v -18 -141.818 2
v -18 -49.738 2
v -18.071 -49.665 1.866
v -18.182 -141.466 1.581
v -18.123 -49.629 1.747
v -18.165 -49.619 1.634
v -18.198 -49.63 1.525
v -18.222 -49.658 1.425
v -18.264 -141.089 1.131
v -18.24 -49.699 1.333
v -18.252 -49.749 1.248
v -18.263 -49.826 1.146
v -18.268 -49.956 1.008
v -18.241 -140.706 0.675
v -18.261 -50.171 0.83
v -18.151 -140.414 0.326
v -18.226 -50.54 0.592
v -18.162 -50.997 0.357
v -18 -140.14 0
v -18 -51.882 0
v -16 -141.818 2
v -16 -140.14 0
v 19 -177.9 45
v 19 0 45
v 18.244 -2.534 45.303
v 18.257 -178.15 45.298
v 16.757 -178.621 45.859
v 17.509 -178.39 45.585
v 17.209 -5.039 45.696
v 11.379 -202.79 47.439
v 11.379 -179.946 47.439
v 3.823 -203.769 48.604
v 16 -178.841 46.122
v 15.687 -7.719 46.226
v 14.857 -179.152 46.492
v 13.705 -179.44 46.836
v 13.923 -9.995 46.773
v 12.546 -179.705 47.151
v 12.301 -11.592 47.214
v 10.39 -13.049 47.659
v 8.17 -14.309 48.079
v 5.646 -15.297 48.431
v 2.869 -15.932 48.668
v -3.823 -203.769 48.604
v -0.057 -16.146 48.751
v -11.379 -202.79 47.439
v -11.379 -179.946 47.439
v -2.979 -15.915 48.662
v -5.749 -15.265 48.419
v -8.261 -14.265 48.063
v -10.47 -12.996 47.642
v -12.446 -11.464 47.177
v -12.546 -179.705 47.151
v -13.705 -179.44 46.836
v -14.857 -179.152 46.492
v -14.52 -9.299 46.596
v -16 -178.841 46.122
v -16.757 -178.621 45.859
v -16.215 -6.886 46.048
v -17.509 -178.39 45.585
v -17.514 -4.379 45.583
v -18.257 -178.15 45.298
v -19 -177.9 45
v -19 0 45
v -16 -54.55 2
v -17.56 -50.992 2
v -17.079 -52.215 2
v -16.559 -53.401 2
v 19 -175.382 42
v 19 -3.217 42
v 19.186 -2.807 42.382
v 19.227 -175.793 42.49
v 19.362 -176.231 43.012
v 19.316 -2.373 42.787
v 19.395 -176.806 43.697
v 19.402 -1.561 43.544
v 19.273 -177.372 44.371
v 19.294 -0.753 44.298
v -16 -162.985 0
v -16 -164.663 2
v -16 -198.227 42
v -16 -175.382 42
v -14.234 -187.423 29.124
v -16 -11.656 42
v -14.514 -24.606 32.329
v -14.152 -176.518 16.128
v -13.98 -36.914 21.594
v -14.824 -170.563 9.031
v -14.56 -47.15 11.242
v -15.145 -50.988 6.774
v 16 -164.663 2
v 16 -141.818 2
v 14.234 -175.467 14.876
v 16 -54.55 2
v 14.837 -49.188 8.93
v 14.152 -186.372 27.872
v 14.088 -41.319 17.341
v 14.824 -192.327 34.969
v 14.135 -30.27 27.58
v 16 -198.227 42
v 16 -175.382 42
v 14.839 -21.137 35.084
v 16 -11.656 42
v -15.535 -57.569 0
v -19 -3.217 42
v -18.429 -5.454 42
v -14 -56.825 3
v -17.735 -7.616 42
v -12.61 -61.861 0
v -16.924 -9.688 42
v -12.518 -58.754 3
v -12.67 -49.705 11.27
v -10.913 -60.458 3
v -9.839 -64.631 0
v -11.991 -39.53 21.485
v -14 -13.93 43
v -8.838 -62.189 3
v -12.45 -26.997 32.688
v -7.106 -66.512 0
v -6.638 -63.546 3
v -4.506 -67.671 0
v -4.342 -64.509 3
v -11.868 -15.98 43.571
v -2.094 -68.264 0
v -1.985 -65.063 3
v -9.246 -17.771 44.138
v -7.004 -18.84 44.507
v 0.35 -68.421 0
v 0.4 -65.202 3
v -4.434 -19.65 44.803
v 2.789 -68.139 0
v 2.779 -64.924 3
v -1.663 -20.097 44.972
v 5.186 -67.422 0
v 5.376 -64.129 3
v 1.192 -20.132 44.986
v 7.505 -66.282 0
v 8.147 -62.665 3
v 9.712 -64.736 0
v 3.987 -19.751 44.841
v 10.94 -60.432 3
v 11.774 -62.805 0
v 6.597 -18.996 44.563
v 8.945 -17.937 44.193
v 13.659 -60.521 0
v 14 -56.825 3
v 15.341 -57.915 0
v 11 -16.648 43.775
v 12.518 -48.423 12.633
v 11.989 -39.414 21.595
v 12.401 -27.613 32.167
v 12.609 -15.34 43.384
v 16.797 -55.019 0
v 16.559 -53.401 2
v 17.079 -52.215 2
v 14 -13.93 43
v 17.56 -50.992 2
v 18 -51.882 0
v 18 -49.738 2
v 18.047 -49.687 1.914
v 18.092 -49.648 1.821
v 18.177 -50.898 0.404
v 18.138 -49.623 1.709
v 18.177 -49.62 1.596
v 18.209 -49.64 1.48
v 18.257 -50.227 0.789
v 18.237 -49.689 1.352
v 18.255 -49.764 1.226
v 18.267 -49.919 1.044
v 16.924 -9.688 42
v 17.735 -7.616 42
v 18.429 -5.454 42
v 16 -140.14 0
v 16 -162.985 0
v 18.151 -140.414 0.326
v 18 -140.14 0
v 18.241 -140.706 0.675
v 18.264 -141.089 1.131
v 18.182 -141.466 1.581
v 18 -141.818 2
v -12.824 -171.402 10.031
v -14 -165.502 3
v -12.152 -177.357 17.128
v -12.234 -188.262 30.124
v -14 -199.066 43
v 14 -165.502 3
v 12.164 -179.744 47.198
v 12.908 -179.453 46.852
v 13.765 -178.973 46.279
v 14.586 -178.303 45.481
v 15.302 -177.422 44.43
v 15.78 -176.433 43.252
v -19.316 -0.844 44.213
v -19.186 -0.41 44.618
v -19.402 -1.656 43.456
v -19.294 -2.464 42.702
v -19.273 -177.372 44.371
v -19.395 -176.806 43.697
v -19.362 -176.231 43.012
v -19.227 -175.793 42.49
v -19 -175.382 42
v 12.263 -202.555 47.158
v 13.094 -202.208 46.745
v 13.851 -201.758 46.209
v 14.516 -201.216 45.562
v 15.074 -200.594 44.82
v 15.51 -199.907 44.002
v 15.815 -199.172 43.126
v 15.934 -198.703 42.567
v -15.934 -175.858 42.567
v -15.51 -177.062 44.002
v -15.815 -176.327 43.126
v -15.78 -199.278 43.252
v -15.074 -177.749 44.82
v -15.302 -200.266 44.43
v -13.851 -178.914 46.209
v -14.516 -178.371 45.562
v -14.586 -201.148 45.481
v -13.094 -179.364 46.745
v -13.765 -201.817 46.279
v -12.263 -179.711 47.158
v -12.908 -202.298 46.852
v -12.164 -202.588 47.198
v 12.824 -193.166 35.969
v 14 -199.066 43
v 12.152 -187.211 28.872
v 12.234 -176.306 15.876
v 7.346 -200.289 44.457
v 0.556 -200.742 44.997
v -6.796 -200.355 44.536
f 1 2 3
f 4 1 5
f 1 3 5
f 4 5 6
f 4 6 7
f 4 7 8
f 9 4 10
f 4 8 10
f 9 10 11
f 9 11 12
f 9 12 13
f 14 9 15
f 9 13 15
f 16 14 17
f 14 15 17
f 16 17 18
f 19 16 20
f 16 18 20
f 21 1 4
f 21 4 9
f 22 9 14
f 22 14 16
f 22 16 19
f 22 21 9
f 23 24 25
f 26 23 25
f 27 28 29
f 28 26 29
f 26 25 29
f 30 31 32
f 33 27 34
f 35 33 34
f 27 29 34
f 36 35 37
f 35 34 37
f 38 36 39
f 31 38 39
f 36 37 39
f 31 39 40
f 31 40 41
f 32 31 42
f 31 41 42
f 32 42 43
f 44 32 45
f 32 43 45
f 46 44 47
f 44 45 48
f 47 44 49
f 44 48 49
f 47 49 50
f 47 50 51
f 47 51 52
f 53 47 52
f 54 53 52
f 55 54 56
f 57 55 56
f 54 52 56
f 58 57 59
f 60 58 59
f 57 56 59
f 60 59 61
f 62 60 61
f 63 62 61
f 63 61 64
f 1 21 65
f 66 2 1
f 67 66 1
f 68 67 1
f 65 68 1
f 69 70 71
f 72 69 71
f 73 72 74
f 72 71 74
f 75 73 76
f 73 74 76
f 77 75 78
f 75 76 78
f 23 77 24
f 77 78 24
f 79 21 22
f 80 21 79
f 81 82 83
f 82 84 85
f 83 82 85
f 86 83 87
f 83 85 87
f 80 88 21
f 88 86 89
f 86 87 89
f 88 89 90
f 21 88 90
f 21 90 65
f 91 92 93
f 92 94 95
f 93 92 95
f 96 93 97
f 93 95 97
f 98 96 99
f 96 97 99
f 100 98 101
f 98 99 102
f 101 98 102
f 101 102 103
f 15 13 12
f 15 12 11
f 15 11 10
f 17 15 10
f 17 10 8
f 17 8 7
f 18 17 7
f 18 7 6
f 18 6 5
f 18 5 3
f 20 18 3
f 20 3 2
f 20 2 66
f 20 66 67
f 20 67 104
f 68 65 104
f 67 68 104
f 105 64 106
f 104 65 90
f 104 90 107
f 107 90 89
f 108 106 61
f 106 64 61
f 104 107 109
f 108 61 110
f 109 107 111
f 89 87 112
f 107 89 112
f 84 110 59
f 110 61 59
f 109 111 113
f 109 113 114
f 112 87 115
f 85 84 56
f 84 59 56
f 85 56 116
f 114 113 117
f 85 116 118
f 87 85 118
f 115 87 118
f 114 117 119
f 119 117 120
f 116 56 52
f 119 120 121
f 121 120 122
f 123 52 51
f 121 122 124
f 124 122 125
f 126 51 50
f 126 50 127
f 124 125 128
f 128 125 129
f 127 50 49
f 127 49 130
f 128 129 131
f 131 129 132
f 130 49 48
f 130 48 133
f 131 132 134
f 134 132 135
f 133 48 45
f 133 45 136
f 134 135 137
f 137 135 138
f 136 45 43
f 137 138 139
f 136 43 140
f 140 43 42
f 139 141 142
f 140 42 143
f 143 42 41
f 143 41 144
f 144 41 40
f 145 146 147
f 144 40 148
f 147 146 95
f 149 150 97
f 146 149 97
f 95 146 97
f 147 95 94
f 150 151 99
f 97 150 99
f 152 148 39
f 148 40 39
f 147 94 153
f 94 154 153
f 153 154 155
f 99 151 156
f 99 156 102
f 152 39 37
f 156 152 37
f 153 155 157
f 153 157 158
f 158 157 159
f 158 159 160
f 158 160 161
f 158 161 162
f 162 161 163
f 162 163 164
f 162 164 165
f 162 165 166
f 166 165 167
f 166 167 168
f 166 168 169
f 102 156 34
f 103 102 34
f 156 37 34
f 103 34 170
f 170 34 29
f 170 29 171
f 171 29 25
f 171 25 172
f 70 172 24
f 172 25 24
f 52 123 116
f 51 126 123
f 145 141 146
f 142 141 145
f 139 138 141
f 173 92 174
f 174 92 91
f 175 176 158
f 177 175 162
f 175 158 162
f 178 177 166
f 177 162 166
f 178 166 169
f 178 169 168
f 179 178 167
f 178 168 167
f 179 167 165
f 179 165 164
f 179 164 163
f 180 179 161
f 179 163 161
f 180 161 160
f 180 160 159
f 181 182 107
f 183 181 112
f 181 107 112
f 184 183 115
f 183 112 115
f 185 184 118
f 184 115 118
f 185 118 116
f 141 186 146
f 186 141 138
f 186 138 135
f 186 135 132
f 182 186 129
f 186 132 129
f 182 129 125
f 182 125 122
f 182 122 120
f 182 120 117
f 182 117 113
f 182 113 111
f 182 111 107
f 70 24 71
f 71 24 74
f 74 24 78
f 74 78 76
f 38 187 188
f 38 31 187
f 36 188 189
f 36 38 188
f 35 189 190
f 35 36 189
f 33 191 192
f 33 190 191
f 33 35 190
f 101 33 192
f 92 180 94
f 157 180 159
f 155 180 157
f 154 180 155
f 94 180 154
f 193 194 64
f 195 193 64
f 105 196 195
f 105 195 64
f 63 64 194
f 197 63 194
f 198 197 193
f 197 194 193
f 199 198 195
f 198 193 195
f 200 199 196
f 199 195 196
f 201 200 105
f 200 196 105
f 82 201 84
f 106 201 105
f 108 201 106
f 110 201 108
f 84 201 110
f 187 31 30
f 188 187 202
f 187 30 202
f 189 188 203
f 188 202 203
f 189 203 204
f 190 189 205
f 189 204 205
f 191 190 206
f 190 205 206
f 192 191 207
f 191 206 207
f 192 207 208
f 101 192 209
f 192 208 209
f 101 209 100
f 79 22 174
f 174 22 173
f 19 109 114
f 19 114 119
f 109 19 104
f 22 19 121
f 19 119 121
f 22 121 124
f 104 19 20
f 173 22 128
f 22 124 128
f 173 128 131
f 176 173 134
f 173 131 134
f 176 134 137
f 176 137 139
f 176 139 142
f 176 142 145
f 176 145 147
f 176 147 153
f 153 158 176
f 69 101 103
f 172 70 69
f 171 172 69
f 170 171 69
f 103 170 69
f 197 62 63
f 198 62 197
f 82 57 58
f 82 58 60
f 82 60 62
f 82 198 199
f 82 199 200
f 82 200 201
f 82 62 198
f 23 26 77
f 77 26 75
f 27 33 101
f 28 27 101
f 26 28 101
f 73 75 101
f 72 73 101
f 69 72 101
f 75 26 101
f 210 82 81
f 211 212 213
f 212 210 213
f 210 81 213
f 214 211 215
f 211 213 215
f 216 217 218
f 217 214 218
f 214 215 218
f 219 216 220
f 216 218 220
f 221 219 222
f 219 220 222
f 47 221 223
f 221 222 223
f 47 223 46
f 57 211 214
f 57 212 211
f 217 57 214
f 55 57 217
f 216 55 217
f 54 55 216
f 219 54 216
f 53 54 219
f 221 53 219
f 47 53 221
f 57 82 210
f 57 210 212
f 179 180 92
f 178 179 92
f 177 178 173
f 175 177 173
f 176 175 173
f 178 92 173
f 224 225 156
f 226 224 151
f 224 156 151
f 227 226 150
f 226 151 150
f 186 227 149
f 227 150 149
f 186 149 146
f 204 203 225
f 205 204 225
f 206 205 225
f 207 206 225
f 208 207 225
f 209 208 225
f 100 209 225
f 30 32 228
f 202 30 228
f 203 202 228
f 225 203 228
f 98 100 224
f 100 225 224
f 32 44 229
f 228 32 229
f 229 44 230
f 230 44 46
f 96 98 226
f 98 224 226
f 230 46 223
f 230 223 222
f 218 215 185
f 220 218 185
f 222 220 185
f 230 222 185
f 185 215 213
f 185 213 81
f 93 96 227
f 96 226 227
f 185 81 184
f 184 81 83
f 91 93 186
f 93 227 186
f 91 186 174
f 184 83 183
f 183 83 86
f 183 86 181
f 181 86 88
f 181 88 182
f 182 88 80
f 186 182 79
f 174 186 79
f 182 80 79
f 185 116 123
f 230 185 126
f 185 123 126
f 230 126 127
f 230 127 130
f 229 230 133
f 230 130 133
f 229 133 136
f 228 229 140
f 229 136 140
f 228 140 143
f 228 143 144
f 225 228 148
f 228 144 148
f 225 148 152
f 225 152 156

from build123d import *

# Parameters (mm, degrees)
F1_DEPTH       = 207.9847365
F2_T1_DEPTH    = 312.4469684912
F3_T1_DEPTH    = 284.4287008275
F6_START       = -2
F6_DEPTH       = 4
F9_START       = 2
F9_DEPTH       = 4
F11_R          = 20
F12_DEPTH      = 90
F12_DEPTH_BACK = 5
F13_T4_DEPTH   = 46.8692709023
F13_T9_DEPTH   = 46.8692709023


# Not quite as in the source:
# - a fillet or chamfer that OpenCascade refuses, or shapes differently, is made with other operations: its cross-section is extruded or revolved along the edge and cut away or added


with BuildPart() as f1:
    # F0 (on Front) → F1 (new body)
    with BuildSketch(Plane.XZ):
        with BuildLine():
            Line((-18, 0), (0, 0))
            Line((0, 0), (18, 0))
            ThreePointArc((18, 0), (18.2679491924, 1), (18, 2))
            Line((18, 2), (16, 2))
            ThreePointArc((16, 2), (13.9795897113, 22), (16, 42))
            Line((16, 42), (19, 42))
            ThreePointArc((19, 42), (19.4019237886, 43.5), (19, 45))
            ThreePointArc((19, 45), (0, 48.7506756806), (-19, 45))
            ThreePointArc((-19, 45), (-19.4019237886, 43.5), (-19, 42))
            Line((-19, 42), (-16, 42))
            ThreePointArc((-16, 42), (-13.9795897113, 22), (-16, 2))
            Line((-16, 2), (-18, 2))
            ThreePointArc((-18, 2), (-18.2679491924, 1), (-18, 0))
        make_face()
        with BuildLine():
            Line((14, 3), (0, 3))
            Line((0, 3), (-14, 3))
            ThreePointArc((-14, 3), (-11.9795897113, 23), (-14, 43))
            ThreePointArc((-14, 43), (0, 45), (14, 43))
            ThreePointArc((14, 43), (11.9795897113, 23), (14, 3))
        make_face(mode=Mode.SUBTRACT)
    extrude(amount=F1_DEPTH)

    # F2: chamfer of 45 x 53.6289116667 on 1 edges, made by hand

    # F2_s2 → F2_t1 (cut)
    with BuildSketch(Plane.YZ.offset(-156.2234842456)):
        Polygon((-207.9847365, 53.6289116667), (-162.9847365, 0), (-207.9847365, 0), align=None)
    extrude(amount=F2_T1_DEPTH, mode=Mode.SUBTRACT)

    # F3: chamfer of 45 x 48.2565919511 on 1 edges, made by hand

    # F3_s2 → F3_t1 (cut)
    with BuildSketch(Plane.YZ.offset(-142.2143504137)):
        Polygon((0, 45), (-48.2565919511, 0), (0, 0), align=None)
    extrude(amount=F3_T1_DEPTH, mode=Mode.SUBTRACT)

    # F5 (on face) → F6 (cut)
    with BuildSketch(Plane(origin=(14, 0, 0), x_dir=(0, -1, 0), z_dir=(-1, 0, 0)).offset(F6_START)):
        Polygon((200.7156460232, 72.1911139462), (140.1401089367, 0), (198.049341578, 0), (232.2688040982, 72.1911139462), align=None)
    extrude(amount=-F6_DEPTH, mode=Mode.SUBTRACT)

    # F8 (on face) → F9 (cut)
    with BuildSketch(Plane(origin=(-14, 0, 0), x_dir=(0, -1, 0), z_dir=(-1, 0, 0)).offset(F9_START)):
        Polygon((185.9322765967, 54.5729803215), (140.1401089367, 0), (168.9397689519, 0), (210.618345394, 54.5729803215), align=None)
    extrude(amount=F9_DEPTH, mode=Mode.SUBTRACT)

    # F11 (on face) → F12 (cut, two sides)
    with BuildSketch(Plane(origin=(0, 22.4451911308, 20.9304793408), x_dir=(-1, 0, 0), z_dir=(0, 0.7313537016, 0.6819983601))) as f12_sk:
        with Locations((0, 26.6659185749)):
            Circle(F11_R)
    extrude(amount=-F12_DEPTH, mode=Mode.SUBTRACT)
    extrude(f12_sk.sketch, amount=F12_DEPTH_BACK, mode=Mode.SUBTRACT)

    # F13: fillet of radius 6 on 2 edges, made by hand


with BuildPart() as f13_tool2:
    # F13_s3 → F13_t4 (new body)
    with BuildSketch(Plane.XZ.offset(213.6976361216)):
        with BuildLine():
            ThreePointArc((11.3791048339, 47.4386205251), (14.5860497205, 45.4810144553), (16, 42))
            Line((16, 42), (16, 46.1215528099))
            ThreePointArc((16, 46.1215528099), (13.7053826002, 46.8356264218), (11.3791048339, 47.4386205251))
        make_face()
    extrude(amount=-F13_T4_DEPTH)

    split(bisect_by=Plane(origin=(0, -82.2375917358, -69.0055328944), x_dir=(1, 0, 0), z_dir=(0, -0.7660444431, -0.6427876097)), keep=Keep.TOP)


with BuildPart() as f1_1:
    add(f1.part)

    # F13_t1: cut F13_tool2
    add(f13_tool2.part, mode=Mode.SUBTRACT)


with BuildPart() as f13_tool7:
    # F13_s8 → F13_t9 (new body)
    with BuildSketch(Plane.XZ.offset(213.6976361216)):
        with BuildLine():
            ThreePointArc((-16, 42), (-14.5860497205, 45.4810144553), (-11.3791048339, 47.4386205251))
            ThreePointArc((-11.3791048339, 47.4386205251), (-13.7053826002, 46.8356264218), (-16, 46.1215528099))
            Line((-16, 46.1215528099), (-16, 42))
        make_face()
    extrude(amount=-F13_T9_DEPTH)

    split(bisect_by=Plane(origin=(0, -82.2375917358, -69.0055328944), x_dir=(1, 0, 0), z_dir=(0, -0.7660444431, -0.6427876097)), keep=Keep.TOP)


with BuildPart() as f1_2:
    add(f1_1.part)

    # F13_t6: cut F13_tool7
    add(f13_tool7.part, mode=Mode.SUBTRACT)


solid = f1_2.part
